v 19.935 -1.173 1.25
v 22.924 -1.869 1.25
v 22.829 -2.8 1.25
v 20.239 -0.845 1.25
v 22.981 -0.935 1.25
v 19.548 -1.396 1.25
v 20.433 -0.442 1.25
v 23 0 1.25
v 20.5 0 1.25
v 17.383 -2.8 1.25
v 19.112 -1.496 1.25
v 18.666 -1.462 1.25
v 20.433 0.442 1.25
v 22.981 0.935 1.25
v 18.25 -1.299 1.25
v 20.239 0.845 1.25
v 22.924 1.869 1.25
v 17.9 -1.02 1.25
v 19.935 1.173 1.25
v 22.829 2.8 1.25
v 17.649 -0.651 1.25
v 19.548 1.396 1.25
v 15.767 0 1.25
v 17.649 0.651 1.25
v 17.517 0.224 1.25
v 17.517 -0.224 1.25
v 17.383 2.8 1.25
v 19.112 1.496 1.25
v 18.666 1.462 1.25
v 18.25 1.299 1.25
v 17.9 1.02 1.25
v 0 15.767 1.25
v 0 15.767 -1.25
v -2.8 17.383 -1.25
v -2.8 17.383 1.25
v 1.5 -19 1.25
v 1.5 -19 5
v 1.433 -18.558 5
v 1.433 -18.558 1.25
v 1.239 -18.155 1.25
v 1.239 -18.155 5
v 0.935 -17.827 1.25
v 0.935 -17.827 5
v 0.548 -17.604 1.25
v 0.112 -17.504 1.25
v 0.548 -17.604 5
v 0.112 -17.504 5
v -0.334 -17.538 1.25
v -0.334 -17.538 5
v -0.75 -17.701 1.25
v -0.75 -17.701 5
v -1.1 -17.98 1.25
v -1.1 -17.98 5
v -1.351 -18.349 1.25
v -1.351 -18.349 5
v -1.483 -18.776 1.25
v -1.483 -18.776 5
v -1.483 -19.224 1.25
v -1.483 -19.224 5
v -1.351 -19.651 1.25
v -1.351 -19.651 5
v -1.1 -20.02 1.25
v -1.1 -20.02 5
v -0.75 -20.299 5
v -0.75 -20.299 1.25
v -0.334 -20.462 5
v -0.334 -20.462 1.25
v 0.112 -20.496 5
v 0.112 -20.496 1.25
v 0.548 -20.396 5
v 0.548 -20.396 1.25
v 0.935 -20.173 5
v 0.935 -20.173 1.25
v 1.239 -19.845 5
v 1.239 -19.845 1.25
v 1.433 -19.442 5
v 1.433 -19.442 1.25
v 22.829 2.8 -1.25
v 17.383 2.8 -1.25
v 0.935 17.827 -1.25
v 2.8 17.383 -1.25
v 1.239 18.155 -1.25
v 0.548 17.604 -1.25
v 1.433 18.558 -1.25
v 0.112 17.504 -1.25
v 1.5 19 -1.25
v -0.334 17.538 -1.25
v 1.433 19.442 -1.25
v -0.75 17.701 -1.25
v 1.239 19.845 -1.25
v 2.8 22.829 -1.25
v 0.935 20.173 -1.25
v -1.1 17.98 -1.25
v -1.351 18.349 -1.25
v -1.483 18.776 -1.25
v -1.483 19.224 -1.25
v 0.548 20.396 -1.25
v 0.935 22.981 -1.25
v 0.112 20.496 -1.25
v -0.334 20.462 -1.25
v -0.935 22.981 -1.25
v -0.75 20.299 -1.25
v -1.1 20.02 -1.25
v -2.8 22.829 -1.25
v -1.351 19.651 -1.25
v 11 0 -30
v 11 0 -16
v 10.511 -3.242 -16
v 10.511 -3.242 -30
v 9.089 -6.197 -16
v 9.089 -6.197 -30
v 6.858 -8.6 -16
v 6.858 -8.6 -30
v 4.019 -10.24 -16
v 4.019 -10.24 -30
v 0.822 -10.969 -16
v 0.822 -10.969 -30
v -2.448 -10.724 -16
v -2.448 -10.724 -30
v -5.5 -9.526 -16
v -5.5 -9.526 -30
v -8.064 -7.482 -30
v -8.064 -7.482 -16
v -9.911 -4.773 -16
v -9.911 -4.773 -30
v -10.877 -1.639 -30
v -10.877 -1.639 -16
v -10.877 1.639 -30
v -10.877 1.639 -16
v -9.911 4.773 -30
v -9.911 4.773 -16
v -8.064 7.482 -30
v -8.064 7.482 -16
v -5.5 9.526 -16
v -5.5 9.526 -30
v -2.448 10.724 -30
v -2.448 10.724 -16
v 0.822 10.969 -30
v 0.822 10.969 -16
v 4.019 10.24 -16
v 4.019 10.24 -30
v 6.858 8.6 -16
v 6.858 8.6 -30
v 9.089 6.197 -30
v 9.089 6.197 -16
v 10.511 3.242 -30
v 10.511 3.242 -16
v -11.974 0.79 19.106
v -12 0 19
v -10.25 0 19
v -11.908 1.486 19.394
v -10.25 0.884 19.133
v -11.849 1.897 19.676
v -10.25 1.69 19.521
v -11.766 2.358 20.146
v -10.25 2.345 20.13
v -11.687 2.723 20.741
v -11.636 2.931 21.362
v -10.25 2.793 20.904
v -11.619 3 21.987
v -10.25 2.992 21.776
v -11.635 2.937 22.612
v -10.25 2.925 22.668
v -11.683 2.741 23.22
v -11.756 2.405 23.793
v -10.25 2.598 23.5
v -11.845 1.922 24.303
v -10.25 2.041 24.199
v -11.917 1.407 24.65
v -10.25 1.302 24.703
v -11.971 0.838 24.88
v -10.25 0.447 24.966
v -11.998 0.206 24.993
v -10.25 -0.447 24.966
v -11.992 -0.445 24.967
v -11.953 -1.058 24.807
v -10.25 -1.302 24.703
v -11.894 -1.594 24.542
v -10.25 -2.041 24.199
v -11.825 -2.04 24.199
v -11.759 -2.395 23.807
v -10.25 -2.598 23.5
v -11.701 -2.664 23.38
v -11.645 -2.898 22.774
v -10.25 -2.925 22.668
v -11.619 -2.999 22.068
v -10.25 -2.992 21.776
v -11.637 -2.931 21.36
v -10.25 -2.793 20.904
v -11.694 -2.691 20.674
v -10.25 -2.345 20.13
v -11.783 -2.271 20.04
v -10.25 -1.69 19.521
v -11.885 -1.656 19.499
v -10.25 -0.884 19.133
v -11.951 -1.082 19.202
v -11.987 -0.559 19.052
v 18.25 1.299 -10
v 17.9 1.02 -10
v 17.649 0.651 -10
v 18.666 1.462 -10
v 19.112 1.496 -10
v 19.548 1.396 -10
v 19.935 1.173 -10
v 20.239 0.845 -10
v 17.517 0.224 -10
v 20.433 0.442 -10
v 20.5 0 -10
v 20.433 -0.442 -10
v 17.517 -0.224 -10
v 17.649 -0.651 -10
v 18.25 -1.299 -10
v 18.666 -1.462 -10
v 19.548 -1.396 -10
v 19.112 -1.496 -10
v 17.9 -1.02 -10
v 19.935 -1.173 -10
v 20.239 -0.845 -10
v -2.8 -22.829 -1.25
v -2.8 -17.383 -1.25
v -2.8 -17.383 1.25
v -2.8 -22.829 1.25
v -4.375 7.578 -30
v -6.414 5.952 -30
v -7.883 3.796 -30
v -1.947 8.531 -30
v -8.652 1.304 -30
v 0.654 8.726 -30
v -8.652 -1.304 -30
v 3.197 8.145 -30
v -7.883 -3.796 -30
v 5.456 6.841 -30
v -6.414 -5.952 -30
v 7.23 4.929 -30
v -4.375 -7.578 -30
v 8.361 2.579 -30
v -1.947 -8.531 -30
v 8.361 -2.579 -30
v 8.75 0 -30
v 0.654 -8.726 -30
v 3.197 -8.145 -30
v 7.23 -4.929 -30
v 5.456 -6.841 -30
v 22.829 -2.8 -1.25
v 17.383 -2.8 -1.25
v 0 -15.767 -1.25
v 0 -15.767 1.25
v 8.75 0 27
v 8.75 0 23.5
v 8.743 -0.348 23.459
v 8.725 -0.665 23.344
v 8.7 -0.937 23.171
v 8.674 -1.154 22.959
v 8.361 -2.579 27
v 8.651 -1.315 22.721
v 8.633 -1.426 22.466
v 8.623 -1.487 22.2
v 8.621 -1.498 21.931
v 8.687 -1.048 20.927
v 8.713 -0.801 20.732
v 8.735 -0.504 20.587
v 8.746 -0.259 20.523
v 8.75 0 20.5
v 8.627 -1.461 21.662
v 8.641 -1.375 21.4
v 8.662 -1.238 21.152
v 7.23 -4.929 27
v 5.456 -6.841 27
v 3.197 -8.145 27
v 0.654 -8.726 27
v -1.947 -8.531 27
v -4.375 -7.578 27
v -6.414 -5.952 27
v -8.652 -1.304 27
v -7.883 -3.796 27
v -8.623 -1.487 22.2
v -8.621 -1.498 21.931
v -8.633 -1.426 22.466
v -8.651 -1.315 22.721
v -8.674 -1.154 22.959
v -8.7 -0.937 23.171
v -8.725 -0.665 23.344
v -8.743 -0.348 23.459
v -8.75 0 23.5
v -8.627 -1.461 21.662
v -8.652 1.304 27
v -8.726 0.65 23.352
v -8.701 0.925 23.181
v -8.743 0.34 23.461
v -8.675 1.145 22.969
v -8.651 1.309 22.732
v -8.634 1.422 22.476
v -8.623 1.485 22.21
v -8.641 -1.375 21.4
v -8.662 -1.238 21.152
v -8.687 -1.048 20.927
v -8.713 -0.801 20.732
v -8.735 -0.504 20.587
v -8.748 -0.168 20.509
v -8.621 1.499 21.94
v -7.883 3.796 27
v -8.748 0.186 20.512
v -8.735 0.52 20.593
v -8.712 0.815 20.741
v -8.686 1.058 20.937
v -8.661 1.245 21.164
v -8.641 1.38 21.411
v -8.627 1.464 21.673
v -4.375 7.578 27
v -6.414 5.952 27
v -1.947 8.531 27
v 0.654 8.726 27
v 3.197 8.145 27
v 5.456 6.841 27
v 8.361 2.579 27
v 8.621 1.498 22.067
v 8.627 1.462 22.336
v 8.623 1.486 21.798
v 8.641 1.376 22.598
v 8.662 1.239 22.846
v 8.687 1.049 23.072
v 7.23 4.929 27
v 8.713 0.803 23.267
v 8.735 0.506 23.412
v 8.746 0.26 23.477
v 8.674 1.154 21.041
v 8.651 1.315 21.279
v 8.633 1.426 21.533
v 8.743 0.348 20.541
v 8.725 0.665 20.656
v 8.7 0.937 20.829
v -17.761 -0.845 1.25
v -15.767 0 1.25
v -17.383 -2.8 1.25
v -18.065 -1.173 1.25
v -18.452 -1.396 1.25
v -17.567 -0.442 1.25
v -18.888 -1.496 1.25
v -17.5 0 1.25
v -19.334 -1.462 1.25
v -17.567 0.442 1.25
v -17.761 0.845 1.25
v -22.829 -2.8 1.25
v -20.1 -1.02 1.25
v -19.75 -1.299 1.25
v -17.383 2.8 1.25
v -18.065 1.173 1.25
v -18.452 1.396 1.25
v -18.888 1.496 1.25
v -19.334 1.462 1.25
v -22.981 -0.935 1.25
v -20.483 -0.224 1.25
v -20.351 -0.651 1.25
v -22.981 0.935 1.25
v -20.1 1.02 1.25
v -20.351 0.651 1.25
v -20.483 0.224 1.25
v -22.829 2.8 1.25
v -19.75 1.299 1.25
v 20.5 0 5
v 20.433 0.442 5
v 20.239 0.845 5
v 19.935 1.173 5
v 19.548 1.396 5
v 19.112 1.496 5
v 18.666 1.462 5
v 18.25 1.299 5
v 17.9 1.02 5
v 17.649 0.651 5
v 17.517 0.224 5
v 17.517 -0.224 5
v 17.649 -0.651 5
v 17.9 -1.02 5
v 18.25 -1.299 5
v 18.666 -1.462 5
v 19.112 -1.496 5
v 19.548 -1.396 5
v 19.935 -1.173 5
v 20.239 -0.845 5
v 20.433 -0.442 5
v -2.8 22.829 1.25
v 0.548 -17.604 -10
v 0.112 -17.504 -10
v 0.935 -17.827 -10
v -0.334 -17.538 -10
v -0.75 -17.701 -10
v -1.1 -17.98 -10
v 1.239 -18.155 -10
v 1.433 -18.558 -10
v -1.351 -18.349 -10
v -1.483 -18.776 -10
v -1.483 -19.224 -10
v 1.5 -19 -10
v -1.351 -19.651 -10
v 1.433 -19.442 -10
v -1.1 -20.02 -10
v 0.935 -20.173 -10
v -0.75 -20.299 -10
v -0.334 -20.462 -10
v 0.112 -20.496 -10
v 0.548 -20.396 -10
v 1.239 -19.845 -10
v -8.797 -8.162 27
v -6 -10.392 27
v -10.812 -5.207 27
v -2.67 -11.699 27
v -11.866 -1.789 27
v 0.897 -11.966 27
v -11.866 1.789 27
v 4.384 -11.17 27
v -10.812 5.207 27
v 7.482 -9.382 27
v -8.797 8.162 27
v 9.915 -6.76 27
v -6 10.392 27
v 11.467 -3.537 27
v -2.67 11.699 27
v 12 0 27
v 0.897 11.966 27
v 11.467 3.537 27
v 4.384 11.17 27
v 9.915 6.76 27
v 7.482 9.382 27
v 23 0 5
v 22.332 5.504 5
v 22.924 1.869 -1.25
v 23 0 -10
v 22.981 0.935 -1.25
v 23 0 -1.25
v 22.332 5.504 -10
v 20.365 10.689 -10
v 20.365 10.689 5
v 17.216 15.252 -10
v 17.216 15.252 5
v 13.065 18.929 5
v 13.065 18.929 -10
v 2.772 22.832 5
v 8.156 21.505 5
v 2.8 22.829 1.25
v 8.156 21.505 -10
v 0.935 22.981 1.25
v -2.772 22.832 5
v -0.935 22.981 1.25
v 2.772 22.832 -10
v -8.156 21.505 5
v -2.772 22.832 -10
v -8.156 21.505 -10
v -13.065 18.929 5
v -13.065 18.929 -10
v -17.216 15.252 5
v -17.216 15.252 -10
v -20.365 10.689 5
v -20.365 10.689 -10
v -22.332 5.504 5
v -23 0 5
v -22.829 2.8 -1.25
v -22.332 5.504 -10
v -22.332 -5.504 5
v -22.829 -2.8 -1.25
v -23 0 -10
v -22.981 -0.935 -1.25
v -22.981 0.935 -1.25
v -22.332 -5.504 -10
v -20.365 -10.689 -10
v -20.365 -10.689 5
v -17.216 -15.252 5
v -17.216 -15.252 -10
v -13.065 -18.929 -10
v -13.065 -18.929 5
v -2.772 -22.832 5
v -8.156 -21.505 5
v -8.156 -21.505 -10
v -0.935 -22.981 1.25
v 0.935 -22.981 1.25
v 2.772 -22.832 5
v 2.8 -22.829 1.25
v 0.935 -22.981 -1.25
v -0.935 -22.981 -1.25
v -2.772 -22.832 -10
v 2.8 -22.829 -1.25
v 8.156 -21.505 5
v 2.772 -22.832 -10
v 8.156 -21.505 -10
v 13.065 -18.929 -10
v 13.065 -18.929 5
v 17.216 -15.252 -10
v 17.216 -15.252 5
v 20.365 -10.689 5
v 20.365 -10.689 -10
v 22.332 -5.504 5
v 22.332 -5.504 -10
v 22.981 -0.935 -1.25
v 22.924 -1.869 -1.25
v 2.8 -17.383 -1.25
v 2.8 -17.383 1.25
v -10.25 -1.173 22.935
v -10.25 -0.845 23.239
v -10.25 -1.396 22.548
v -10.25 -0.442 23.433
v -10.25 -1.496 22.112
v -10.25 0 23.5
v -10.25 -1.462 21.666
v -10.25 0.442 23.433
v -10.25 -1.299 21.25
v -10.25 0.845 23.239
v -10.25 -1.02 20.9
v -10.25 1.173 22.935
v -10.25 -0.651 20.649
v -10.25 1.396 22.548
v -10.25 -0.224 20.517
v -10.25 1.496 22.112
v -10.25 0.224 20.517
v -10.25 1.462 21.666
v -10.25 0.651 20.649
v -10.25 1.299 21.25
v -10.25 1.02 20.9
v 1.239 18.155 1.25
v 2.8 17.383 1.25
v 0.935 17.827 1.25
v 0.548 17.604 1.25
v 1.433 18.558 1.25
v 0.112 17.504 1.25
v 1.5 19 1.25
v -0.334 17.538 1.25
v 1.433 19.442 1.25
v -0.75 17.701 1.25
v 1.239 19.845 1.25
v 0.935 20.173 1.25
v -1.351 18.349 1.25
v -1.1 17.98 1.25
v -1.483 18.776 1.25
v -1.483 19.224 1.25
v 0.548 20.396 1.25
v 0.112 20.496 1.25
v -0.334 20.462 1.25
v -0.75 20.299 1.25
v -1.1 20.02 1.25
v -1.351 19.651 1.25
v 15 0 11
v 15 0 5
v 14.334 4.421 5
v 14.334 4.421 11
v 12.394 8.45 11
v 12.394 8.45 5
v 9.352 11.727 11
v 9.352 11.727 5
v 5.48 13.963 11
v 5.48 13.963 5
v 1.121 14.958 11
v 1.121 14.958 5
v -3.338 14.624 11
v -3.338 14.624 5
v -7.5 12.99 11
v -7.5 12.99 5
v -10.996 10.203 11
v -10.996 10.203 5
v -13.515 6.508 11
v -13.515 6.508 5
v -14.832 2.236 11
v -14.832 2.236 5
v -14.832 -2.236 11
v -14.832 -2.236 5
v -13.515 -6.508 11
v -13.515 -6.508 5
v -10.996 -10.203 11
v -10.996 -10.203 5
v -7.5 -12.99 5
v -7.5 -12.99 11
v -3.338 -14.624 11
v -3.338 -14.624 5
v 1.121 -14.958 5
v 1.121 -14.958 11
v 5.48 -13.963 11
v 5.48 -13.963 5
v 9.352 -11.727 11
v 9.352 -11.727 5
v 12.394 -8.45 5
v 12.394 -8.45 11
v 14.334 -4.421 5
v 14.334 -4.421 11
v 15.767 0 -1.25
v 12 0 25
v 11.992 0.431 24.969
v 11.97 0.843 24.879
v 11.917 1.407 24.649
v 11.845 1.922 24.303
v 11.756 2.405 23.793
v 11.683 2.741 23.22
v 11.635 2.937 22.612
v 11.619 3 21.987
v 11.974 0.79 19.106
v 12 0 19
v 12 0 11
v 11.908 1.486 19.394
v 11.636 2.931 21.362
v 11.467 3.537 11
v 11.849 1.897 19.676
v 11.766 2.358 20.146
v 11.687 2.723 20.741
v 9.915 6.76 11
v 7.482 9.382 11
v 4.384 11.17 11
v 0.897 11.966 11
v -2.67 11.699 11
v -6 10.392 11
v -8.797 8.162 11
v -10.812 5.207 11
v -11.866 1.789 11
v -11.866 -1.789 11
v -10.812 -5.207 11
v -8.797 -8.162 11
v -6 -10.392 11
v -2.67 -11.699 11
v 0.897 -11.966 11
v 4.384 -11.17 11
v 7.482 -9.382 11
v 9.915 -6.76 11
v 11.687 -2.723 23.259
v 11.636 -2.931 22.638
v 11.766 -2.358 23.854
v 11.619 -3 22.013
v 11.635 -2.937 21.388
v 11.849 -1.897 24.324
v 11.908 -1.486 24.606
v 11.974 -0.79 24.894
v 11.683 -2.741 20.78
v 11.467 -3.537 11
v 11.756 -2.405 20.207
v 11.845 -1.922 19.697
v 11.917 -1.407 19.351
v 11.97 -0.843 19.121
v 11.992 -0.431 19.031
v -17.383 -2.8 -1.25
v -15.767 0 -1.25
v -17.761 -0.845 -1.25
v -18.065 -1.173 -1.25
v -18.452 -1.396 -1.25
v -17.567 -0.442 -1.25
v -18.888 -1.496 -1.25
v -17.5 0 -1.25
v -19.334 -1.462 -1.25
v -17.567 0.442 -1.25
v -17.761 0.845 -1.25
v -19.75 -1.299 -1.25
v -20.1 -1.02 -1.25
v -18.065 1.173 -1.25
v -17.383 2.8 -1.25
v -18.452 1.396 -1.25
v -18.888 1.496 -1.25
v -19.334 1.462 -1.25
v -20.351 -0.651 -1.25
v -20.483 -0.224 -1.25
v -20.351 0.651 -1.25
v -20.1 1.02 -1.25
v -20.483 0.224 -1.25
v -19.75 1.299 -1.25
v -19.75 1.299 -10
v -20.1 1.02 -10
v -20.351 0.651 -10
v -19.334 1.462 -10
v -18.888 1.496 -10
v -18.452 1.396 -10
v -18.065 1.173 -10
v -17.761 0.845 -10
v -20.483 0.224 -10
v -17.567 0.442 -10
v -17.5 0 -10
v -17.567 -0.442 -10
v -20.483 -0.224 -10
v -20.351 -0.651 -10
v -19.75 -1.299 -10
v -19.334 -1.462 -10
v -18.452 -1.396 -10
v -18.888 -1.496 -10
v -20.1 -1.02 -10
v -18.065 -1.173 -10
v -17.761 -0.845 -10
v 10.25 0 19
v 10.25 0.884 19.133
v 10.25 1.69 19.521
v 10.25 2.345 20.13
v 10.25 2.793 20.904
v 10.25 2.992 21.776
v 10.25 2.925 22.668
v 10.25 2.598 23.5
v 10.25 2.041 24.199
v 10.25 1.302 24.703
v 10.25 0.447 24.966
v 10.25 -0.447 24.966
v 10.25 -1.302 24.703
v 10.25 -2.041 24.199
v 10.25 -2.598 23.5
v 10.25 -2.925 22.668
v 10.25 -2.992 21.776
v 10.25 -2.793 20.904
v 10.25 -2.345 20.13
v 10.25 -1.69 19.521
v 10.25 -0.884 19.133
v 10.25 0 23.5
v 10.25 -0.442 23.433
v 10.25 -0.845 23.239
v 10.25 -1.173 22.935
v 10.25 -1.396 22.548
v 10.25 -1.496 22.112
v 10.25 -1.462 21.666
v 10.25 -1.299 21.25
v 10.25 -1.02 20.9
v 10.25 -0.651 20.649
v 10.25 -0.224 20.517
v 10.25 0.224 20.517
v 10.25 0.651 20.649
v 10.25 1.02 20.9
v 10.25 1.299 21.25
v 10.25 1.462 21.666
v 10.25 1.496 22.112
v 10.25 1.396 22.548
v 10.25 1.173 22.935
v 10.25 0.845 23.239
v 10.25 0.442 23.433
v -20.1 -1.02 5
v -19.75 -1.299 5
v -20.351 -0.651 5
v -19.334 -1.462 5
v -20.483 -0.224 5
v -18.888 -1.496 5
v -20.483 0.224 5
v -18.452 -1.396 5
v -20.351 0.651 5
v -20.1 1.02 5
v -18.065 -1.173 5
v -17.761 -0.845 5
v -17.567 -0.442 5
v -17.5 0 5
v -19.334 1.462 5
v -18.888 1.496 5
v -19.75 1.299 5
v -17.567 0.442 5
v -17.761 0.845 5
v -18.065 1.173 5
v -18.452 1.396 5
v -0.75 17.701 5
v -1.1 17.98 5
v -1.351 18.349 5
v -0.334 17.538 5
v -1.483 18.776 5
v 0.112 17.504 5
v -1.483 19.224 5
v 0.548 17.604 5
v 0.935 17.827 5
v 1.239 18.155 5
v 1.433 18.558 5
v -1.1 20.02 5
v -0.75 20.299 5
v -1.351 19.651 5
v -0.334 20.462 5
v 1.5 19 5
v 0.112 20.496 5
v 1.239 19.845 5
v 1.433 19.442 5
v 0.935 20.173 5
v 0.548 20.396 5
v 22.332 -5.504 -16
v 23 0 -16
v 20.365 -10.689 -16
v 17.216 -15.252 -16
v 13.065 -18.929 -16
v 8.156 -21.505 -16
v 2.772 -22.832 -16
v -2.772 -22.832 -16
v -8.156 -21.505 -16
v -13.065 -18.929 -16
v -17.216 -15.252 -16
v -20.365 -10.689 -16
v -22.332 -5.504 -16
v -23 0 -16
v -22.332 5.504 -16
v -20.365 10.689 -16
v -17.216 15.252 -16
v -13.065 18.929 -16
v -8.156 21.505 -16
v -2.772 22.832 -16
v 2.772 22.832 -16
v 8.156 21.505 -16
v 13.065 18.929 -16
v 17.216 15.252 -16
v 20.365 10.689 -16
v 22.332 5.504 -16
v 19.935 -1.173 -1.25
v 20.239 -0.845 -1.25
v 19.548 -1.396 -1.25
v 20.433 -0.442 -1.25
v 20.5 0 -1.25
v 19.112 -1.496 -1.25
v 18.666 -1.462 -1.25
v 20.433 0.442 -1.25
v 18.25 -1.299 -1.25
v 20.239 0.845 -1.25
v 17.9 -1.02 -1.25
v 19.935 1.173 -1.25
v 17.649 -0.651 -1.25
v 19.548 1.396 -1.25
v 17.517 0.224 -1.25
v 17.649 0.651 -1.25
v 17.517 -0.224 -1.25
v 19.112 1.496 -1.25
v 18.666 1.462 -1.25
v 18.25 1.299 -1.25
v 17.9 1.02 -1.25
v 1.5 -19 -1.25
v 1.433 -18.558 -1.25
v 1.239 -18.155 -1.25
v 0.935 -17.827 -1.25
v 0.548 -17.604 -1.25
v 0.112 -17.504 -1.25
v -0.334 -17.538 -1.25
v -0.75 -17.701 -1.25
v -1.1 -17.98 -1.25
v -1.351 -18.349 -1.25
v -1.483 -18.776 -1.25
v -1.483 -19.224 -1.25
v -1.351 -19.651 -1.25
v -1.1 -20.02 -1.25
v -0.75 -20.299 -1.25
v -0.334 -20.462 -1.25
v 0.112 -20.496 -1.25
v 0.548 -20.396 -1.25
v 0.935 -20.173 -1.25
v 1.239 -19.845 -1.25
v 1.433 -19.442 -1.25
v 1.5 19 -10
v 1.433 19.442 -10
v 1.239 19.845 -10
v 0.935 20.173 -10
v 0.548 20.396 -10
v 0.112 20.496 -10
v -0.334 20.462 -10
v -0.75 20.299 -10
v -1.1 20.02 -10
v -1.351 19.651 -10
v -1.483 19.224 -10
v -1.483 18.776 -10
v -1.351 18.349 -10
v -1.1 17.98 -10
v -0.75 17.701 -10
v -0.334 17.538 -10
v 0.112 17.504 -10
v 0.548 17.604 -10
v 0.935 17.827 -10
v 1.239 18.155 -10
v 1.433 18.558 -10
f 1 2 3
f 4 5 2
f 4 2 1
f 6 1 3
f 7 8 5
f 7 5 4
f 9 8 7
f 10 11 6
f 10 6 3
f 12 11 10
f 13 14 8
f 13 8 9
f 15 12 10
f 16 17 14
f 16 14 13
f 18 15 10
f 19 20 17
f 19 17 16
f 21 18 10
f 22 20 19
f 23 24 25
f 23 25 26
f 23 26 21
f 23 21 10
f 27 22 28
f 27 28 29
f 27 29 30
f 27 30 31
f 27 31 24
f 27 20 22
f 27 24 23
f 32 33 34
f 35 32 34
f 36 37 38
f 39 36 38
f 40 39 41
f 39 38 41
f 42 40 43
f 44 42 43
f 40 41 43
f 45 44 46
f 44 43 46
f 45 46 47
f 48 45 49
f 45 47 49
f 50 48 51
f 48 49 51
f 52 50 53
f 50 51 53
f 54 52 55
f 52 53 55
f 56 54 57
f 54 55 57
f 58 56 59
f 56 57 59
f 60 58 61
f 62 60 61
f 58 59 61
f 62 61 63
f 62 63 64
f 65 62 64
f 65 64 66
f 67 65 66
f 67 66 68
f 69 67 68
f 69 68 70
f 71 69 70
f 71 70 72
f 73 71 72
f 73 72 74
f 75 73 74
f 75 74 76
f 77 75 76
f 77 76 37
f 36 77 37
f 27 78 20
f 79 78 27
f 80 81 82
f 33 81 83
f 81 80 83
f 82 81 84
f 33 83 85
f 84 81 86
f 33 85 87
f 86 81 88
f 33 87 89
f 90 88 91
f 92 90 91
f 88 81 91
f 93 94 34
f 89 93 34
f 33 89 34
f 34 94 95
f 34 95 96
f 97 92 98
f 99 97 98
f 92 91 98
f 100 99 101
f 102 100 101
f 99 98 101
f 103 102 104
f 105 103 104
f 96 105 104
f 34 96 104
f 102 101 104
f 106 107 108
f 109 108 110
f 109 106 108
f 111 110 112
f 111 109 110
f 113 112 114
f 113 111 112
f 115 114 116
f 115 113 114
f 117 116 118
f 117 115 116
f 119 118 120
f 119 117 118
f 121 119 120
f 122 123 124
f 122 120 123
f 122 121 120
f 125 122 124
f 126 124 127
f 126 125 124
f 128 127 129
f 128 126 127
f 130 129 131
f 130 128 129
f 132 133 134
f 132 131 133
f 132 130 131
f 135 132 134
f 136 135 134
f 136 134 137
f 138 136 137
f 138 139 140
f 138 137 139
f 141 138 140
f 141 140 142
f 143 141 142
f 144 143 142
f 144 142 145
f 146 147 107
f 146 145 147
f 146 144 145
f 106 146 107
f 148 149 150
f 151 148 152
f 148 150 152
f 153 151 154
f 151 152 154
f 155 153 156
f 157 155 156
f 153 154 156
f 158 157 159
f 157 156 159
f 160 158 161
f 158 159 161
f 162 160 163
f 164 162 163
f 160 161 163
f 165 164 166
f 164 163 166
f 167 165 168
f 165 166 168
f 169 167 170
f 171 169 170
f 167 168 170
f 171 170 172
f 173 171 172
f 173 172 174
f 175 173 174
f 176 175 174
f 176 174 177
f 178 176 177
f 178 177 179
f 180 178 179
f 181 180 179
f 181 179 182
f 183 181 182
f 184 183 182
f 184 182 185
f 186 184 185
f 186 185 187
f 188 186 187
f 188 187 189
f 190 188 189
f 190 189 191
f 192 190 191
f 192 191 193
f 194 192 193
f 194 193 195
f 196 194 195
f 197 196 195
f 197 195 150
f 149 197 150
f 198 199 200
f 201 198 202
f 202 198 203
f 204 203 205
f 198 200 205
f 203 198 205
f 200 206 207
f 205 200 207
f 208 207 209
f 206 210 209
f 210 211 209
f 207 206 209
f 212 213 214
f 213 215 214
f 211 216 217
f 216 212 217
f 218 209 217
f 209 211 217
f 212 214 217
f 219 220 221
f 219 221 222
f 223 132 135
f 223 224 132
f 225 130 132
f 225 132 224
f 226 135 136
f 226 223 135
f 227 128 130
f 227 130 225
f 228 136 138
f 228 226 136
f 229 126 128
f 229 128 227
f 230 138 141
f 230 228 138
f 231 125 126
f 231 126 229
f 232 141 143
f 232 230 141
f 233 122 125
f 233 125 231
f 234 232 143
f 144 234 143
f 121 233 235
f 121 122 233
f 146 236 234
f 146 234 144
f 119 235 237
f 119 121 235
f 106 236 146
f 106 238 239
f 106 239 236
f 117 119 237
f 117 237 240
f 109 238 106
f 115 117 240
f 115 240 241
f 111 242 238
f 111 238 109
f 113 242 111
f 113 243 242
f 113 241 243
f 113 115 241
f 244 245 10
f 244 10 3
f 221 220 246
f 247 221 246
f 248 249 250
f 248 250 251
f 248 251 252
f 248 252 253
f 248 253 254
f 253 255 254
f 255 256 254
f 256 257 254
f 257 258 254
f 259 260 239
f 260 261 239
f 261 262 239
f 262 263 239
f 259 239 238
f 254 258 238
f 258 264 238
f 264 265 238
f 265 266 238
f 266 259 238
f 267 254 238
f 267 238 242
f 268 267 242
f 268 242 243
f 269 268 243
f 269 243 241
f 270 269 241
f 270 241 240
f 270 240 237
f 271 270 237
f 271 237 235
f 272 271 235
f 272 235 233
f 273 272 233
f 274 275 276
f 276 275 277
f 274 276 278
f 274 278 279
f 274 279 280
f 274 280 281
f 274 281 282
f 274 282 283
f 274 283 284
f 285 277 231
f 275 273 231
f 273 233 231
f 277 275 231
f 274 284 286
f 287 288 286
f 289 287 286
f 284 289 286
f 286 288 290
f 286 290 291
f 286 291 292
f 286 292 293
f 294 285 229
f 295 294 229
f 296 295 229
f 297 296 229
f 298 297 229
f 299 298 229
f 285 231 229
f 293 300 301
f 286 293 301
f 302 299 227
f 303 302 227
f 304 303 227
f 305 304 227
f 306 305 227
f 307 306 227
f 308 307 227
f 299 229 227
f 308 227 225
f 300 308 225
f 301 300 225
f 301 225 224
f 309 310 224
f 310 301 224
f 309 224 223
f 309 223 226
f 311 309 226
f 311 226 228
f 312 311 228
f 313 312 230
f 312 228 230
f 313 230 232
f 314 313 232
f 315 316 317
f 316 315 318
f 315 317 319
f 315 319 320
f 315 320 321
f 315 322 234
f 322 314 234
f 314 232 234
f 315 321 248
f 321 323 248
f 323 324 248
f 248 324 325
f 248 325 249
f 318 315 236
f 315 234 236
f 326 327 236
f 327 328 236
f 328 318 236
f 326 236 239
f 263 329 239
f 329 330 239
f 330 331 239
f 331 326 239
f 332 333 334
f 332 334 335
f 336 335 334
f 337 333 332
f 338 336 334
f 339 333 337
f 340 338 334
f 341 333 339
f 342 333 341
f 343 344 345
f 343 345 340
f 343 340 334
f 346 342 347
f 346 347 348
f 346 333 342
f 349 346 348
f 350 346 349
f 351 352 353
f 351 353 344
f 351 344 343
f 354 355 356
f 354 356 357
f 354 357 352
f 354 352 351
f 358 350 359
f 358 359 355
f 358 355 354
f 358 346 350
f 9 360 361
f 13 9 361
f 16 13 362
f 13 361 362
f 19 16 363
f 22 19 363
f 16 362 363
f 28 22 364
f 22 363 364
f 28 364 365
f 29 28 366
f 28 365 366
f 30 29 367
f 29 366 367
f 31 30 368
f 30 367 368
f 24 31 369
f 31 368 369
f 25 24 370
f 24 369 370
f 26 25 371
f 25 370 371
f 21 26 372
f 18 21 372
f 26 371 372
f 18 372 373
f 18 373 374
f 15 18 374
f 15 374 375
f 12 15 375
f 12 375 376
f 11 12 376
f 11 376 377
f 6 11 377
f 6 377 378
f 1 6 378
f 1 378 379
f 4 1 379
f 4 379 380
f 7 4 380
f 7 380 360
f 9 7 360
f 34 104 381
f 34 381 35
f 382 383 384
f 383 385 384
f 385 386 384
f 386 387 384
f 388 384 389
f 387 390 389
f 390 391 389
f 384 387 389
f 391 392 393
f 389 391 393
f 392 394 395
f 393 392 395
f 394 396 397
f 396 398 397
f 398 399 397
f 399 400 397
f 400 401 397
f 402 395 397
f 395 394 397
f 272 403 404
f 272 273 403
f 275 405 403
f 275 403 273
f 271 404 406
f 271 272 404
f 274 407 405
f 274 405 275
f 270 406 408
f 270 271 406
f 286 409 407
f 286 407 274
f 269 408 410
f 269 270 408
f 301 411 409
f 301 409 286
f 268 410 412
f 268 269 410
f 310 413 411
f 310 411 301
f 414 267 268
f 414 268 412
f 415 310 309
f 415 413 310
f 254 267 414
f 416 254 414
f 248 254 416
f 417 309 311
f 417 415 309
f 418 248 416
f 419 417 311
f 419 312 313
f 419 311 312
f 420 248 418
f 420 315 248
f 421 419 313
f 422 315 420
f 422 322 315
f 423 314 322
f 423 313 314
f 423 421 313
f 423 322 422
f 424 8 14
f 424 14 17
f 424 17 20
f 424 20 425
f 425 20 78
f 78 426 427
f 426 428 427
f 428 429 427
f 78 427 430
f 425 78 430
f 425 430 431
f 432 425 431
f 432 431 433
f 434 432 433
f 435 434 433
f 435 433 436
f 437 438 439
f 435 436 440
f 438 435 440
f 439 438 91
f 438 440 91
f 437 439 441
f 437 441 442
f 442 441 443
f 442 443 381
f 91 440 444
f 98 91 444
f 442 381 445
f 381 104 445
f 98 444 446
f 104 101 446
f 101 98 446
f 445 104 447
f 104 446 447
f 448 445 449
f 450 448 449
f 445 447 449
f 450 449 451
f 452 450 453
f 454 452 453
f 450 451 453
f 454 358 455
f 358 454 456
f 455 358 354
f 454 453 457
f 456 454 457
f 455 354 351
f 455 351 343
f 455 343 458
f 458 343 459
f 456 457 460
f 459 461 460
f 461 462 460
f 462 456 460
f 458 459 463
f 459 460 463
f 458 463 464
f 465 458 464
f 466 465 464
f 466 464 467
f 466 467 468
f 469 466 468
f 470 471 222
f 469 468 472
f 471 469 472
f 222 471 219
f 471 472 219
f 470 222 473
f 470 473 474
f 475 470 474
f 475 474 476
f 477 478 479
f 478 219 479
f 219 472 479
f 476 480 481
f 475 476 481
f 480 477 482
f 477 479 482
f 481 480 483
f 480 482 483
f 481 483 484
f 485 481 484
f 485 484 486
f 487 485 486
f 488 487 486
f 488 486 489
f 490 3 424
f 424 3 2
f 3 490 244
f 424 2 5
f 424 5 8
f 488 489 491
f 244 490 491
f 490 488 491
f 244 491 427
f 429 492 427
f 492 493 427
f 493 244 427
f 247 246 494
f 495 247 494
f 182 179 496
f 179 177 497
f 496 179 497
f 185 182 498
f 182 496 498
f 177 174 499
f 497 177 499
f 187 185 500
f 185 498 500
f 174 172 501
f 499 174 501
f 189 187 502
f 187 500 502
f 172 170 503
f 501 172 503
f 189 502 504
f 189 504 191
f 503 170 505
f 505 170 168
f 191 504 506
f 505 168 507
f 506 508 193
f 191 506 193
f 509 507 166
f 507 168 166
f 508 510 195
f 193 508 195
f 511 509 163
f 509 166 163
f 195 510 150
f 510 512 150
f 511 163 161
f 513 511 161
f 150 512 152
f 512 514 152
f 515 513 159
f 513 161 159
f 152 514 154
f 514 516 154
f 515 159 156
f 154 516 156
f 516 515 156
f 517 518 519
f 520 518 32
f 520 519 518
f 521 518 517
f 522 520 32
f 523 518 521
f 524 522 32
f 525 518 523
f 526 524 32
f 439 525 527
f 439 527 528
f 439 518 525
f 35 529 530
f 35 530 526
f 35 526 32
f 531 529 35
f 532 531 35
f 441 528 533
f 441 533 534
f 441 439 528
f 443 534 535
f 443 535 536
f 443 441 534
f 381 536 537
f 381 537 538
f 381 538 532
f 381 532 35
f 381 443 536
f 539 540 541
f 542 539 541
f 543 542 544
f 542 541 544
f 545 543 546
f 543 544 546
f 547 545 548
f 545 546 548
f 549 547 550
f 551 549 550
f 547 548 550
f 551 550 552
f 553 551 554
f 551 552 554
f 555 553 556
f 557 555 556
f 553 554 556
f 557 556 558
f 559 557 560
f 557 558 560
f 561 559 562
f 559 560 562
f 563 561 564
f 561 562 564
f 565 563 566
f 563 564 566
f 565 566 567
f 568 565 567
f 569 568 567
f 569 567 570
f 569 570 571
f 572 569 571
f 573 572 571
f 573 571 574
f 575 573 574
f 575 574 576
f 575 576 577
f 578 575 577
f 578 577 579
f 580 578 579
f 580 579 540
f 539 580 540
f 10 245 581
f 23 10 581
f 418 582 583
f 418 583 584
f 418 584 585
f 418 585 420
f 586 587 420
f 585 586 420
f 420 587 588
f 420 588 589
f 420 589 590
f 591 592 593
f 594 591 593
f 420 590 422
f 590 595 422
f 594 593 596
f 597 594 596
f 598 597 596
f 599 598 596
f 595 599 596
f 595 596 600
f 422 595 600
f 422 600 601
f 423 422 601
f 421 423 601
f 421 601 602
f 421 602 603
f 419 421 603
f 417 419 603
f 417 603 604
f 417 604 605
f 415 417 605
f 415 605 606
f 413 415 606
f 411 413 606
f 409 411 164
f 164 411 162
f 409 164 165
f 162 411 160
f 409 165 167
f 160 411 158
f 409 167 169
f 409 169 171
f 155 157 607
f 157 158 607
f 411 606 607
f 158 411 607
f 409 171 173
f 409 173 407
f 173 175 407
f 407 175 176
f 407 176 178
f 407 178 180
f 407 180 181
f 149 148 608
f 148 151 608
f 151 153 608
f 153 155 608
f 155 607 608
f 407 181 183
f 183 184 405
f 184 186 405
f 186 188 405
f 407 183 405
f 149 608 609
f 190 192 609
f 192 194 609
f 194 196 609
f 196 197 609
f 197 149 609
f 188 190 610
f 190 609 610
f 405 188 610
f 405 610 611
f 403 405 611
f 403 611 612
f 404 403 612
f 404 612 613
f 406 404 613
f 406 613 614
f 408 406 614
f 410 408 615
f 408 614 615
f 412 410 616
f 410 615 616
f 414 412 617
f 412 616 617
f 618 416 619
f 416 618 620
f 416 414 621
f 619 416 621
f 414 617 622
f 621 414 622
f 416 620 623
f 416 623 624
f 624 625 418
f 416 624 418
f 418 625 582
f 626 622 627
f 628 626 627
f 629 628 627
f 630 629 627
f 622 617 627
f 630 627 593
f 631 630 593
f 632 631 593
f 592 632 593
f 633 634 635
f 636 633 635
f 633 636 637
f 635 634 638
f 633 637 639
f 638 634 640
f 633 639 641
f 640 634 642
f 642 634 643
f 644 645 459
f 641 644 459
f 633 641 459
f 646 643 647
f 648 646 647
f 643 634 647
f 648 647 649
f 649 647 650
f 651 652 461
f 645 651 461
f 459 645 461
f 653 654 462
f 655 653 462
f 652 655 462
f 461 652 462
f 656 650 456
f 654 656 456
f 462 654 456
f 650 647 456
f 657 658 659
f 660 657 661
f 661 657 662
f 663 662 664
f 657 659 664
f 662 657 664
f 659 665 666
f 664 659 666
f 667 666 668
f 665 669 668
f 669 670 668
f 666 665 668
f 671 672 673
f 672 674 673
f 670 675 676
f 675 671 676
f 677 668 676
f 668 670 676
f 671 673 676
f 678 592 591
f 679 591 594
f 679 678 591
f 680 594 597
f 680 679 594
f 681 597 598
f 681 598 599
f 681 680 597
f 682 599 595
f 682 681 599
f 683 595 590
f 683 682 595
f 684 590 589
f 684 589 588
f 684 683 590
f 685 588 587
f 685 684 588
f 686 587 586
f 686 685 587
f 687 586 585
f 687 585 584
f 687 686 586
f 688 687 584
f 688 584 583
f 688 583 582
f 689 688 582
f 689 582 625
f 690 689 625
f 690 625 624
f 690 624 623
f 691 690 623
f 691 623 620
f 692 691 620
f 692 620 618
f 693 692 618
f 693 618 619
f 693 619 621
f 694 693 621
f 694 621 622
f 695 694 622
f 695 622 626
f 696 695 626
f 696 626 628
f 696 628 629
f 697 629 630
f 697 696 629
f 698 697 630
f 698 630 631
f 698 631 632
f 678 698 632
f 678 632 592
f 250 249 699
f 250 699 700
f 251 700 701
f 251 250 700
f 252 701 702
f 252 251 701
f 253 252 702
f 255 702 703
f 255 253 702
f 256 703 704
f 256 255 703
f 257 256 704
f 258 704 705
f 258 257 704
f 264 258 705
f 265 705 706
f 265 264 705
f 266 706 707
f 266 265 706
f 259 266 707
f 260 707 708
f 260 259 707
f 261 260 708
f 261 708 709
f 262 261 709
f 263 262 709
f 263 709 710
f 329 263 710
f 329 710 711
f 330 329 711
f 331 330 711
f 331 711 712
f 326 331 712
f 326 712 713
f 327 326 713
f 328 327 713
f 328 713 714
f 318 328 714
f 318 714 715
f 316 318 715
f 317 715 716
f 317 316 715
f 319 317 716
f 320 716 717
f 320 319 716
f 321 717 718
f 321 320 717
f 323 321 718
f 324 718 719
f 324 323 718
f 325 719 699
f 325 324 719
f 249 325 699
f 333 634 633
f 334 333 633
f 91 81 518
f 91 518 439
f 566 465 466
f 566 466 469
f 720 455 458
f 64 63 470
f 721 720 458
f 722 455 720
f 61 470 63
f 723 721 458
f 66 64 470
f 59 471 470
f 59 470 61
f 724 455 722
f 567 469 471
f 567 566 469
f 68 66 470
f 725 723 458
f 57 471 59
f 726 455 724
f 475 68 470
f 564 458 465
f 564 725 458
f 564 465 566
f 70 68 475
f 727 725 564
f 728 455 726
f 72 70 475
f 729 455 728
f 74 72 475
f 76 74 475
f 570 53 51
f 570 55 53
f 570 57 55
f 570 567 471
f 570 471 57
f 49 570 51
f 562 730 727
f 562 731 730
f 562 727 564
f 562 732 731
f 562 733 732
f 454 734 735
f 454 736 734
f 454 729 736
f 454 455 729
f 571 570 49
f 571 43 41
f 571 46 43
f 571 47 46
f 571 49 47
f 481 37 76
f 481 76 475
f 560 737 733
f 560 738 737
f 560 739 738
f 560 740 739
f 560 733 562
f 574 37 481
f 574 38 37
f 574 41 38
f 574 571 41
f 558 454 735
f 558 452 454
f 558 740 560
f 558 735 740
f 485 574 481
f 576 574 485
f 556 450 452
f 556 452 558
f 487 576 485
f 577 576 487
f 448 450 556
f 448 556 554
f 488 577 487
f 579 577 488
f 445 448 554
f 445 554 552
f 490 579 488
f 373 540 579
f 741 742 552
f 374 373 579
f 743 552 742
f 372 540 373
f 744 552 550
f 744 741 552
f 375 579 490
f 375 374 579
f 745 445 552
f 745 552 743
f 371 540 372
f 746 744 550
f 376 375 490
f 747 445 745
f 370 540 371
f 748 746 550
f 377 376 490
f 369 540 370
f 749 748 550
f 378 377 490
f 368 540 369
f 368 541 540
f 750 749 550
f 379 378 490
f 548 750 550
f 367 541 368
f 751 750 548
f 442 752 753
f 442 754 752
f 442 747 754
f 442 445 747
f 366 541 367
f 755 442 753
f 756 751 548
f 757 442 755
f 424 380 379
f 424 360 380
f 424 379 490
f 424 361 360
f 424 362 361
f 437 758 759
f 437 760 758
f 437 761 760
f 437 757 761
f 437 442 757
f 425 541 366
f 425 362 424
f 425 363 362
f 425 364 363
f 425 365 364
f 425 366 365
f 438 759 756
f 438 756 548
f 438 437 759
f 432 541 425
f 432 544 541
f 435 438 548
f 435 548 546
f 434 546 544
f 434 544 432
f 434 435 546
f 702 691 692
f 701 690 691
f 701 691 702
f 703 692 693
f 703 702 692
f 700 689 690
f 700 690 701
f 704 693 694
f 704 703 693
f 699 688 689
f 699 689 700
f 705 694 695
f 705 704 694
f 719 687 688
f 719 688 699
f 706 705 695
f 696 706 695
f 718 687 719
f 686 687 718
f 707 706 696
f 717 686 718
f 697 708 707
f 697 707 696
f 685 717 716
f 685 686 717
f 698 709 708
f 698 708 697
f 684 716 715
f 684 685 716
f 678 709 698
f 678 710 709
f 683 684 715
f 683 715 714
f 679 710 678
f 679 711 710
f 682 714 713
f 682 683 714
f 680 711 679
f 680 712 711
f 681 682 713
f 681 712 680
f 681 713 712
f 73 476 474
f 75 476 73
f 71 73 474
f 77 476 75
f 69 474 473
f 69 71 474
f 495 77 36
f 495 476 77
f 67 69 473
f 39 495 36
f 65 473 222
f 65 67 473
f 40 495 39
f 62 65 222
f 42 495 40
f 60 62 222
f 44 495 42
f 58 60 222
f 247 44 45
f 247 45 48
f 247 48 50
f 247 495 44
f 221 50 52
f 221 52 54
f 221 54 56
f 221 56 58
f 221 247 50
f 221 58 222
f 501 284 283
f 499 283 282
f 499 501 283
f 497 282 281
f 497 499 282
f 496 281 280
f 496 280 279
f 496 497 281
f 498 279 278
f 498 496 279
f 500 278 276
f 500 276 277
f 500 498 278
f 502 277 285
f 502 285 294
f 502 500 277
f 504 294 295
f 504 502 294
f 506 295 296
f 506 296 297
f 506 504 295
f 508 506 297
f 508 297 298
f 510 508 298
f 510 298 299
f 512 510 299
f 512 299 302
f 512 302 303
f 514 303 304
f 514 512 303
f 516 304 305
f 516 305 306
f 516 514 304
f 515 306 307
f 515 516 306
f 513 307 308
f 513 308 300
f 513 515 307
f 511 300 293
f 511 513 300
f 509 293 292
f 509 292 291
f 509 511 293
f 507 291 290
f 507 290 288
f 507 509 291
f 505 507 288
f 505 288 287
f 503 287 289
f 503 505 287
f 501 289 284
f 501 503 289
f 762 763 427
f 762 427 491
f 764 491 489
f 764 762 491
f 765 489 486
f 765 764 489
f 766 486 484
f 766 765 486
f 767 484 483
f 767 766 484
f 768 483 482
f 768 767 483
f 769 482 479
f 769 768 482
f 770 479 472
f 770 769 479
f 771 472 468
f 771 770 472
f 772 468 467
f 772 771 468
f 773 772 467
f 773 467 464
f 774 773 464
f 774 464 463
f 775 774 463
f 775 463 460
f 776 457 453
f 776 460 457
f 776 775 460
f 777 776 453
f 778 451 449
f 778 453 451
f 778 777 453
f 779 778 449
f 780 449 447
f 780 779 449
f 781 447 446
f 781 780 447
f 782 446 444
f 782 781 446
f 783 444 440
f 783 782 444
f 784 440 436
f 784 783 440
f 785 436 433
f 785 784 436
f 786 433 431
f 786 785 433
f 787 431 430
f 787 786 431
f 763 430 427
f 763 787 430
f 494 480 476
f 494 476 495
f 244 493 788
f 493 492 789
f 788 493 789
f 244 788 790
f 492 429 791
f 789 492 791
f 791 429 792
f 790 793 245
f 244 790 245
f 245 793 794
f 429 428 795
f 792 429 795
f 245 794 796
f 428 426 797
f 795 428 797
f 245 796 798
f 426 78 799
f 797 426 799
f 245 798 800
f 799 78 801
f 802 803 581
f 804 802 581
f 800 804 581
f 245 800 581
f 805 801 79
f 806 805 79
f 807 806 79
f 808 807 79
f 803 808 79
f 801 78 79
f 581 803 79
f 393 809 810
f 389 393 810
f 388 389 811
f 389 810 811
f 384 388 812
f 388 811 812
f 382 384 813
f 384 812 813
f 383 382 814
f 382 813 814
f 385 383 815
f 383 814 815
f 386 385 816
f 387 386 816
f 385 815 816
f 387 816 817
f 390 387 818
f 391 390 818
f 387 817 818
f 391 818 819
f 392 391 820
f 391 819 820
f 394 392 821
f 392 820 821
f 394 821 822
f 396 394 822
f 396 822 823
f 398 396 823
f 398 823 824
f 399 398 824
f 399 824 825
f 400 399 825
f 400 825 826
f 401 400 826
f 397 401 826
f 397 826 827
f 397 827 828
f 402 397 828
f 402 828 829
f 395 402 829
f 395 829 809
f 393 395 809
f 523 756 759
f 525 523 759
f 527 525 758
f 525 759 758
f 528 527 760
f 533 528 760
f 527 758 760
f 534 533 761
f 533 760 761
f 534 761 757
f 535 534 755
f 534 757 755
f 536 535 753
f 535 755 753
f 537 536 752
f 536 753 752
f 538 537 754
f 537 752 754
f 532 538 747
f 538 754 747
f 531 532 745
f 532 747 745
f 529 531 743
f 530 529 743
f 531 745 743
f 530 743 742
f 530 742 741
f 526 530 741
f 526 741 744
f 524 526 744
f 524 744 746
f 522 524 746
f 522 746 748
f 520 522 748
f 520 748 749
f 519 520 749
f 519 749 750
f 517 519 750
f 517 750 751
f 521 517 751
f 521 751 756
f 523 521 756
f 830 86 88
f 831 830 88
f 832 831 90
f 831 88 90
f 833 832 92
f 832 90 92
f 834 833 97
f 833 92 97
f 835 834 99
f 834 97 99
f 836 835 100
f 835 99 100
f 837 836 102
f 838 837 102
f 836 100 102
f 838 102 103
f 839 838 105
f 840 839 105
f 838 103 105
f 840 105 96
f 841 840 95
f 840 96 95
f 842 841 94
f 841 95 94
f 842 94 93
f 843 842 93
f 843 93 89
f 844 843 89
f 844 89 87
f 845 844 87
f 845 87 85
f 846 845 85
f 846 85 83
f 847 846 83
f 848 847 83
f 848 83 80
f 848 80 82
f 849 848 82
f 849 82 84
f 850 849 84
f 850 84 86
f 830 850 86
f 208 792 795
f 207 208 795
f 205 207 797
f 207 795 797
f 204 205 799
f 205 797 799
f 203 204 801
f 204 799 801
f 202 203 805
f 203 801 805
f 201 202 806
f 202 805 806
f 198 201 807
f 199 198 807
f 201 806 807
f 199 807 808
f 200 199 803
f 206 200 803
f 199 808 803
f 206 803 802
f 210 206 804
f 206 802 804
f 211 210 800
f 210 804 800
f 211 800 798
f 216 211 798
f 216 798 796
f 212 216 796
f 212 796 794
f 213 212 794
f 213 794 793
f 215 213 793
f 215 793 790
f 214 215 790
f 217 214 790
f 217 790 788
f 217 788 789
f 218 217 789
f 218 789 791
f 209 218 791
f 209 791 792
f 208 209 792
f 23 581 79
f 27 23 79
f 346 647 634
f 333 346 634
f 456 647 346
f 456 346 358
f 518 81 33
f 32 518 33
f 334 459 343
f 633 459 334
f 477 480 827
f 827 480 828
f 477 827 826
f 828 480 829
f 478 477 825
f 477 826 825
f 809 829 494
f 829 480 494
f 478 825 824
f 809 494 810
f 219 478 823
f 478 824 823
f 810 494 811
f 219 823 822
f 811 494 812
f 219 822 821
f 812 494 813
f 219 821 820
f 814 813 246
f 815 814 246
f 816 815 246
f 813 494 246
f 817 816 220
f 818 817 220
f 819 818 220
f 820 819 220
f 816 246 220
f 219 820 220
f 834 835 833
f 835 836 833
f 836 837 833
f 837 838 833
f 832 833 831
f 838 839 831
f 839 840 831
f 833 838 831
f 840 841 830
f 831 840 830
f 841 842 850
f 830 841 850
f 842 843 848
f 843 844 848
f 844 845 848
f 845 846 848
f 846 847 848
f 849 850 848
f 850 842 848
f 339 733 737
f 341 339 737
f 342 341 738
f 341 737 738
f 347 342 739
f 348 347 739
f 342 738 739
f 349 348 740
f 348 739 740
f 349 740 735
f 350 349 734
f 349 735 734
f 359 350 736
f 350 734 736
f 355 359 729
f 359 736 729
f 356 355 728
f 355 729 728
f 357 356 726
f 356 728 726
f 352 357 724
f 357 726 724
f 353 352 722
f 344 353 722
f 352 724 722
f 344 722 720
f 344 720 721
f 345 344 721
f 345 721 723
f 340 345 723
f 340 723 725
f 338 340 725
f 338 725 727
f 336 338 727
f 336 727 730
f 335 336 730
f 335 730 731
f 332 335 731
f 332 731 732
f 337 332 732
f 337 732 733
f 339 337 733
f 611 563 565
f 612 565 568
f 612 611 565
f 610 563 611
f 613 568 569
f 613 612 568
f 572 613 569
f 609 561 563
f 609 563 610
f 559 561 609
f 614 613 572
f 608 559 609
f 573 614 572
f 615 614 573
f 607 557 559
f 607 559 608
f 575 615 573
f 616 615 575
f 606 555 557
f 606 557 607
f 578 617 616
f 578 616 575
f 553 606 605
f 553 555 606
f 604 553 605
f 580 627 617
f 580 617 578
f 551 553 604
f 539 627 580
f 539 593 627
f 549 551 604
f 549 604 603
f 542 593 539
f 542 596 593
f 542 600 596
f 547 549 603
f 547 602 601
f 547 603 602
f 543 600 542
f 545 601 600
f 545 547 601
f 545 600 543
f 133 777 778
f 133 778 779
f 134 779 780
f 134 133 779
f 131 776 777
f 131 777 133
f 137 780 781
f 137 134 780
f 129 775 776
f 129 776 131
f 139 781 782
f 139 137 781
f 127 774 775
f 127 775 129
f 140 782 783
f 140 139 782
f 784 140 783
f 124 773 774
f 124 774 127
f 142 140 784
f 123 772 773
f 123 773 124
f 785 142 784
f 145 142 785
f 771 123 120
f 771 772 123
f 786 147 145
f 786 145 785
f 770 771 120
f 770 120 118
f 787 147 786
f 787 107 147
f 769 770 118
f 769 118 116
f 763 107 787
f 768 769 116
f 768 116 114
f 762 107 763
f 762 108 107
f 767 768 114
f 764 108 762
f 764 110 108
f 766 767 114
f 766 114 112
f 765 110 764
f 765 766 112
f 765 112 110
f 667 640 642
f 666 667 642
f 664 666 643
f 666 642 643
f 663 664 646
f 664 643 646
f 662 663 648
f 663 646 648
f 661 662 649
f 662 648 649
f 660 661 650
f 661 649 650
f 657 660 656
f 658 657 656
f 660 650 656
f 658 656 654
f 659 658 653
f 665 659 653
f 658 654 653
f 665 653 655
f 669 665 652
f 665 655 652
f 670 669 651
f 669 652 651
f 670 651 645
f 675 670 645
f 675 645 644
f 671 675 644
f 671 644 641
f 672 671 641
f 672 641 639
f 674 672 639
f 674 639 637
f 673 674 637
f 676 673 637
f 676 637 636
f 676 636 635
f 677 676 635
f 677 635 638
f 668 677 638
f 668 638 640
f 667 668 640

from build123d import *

# Parameters (mm, degrees)
BOSS_EXTRUDE1_DEPTH      = 11
BOSS_EXTRUDE1_DEPTH_BACK = 5
SKETCH1_R                = 15
SKETCH1_R_2              = 13
BOSS_EXTRUDE2_DEPTH      = 5
BOSS_EXTRUDE2_DEPTH_BACK = 10
SKETCH2_R                = 23
SKETCH2_R_2              = 8.75
SKETCH6_R                = 1.5
CUT_EXTRUDE1_DEPTH       = 23
CUT_EXTRUDE2_DEPTH       = 1.25
CUT_EXTRUDE2_DEPTH_BACK  = 1.25
SKETCH13_R               = 13
SKETCH13_R_2             = 8.75
BOSS_EXTRUDE5_DEPTH      = 6
SKETCH14_R               = 12
SKETCH14_R_2             = 8.75
BOSS_EXTRUDE6_DEPTH      = 16
BOSS_EXTRUDE7_START      = 20
SKETCH17_R               = 11
SKETCH17_R_2             = 8.75
BOSS_EXTRUDE7_DEPTH      = 20
CUT_EXTRUDE3_DEPTH       = 57
CUT_EXTRUDE3_DEPTH_BACK  = 57
SKETCH18_R               = 1.5
SKETCH19_R               = 3
CUT_EXTRUDE4_DEPTH       = 14
BOSS_EXTRUDE8_START      = 6
SKETCH20_R               = 23
SKETCH20_R_2             = 11
BOSS_EXTRUDE8_DEPTH      = 6


with BuildPart() as part:
    # Sketch1 → Boss-Extrude1 (new, two sides: drawn at the far end of the back side and taken through both)
    with BuildSketch(Plane.XY.offset(-BOSS_EXTRUDE1_DEPTH_BACK)):
        Circle(SKETCH1_R)
        Circle(SKETCH1_R_2, mode=Mode.SUBTRACT)
    extrude(amount=BOSS_EXTRUDE1_DEPTH + BOSS_EXTRUDE1_DEPTH_BACK)

    # Sketch2 → Boss-Extrude2 (add, two sides: drawn at the far end of the back side and taken through both)
    with BuildSketch(Plane.XY.offset(-BOSS_EXTRUDE2_DEPTH_BACK)):
        Circle(SKETCH2_R)
        Circle(SKETCH2_R_2, mode=Mode.SUBTRACT)
    extrude(amount=BOSS_EXTRUDE2_DEPTH + BOSS_EXTRUDE2_DEPTH_BACK)

    # Sketch6 → Cut-Extrude1 (cut)
    with BuildSketch(Plane.XY.offset(5)):
        with Locations((0, 19)):
            Circle(SKETCH6_R)
        with Locations((19, 0)):
            Circle(SKETCH6_R)
        with Locations((0, -19)):
            Circle(SKETCH6_R)
        with Locations((-19, 0)):
            Circle(SKETCH6_R)
    extrude(amount=-CUT_EXTRUDE1_DEPTH, mode=Mode.SUBTRACT)

    # Sketch9 → Cut-Extrude2 (cut, two sides: drawn at the far end of the back side and taken through both)
    with BuildSketch(Plane.XY.offset(-CUT_EXTRUDE2_DEPTH_BACK)):
        Polygon((-2.8, 20.616580754), (-2.8, 26.448707706), (2.8, 26.448707706), (2.8, 20.616580754), (2.8, 17.383419246), (0, 15.766838493), (-2.8, 17.383419246), align=None)
        Polygon((20.616580754, 2.8), (26.448707706, 2.8), (26.448707706, -2.8), (20.616580754, -2.8), (17.383419246, -2.8), (15.766838493, 0), (17.383419246, 2.8), align=None)
        Polygon((2.8, -20.616580754), (2.8, -26.448707706), (-2.8, -26.448707706), (-2.8, -20.616580754), (-2.8, -17.383419246), (0, -15.766838493), (2.8, -17.383419246), align=None)
        Polygon((-20.616580754, -2.8), (-26.448707706, -2.8), (-26.448707706, 2.8), (-20.616580754, 2.8), (-17.383419246, 2.8), (-15.766838493, 0), (-17.383419246, -2.8), align=None)
    extrude(amount=CUT_EXTRUDE2_DEPTH + CUT_EXTRUDE2_DEPTH_BACK, mode=Mode.SUBTRACT)

    # Sketch13 → Boss-Extrude5 (add)
    with BuildSketch(Plane.XY.offset(5)):
        Circle(SKETCH13_R)
        Circle(SKETCH13_R_2, mode=Mode.SUBTRACT)
    extrude(amount=BOSS_EXTRUDE5_DEPTH)

    # Sketch14 → Boss-Extrude6 (add)
    with BuildSketch(Plane.XY.offset(11)):
        Circle(SKETCH14_R)
        Circle(SKETCH14_R_2, mode=Mode.SUBTRACT)
    extrude(amount=BOSS_EXTRUDE6_DEPTH)

    # Sketch17 → Boss-Extrude7 (add)
    with BuildSketch(Plane(origin=(0, 0, -10), x_dir=(-1, 0, 0), z_dir=(0, 0, -1)).offset(BOSS_EXTRUDE7_START)):
        with Locations(Location((0, 0, 0), (0, 0, 180))):
            Circle(SKETCH17_R)
        with Locations(Location((0, 0, 0), (0, 0, 180))):
            Circle(SKETCH17_R_2, mode=Mode.SUBTRACT)
    extrude(amount=-BOSS_EXTRUDE7_DEPTH)

    # Sketch18 → Cut-Extrude3 (cut, two sides: drawn at the far end of the back side and taken through both)
    with BuildSketch(Plane(origin=(0, 0, 0), x_dir=(0, 0, -1), z_dir=(1, 0, 0)).offset(-CUT_EXTRUDE3_DEPTH_BACK)):
        with Locations(Location((-22, 0, 0), (0, 0, 180))):
            Circle(SKETCH18_R)
    extrude(amount=CUT_EXTRUDE3_DEPTH + CUT_EXTRUDE3_DEPTH_BACK, mode=Mode.SUBTRACT)

    # Sketch19 → Cut-Extrude4 (cut)
    with BuildSketch(Plane(origin=(10.25, 0, 0), x_dir=(0, 0, -1), z_dir=(1, 0, 0))):
        with Locations((-22, 0)):
            Circle(SKETCH19_R)
    cut_extrude4 = extrude(amount=CUT_EXTRUDE4_DEPTH, mode=Mode.SUBTRACT)

    # Mirror1: Cut-Extrude4 across plane
    add(cut_extrude4.mirror(Plane(origin=(0, 0, 0), x_dir=(0, 0, 1), z_dir=(1, 0, 0))), mode=Mode.SUBTRACT)

    # Sketch20 → Boss-Extrude8 (add)
    with BuildSketch(Plane(origin=(0, 0, -10), x_dir=(-1, 0, 0), z_dir=(0, 0, -1)).offset(BOSS_EXTRUDE8_START)):
        with Locations(Location((0, 0, 0), (0, 0, 180))):
            Circle(SKETCH20_R)
        Circle(SKETCH20_R_2, mode=Mode.SUBTRACT)
    extrude(amount=-BOSS_EXTRUDE8_DEPTH)


solid = part.part
